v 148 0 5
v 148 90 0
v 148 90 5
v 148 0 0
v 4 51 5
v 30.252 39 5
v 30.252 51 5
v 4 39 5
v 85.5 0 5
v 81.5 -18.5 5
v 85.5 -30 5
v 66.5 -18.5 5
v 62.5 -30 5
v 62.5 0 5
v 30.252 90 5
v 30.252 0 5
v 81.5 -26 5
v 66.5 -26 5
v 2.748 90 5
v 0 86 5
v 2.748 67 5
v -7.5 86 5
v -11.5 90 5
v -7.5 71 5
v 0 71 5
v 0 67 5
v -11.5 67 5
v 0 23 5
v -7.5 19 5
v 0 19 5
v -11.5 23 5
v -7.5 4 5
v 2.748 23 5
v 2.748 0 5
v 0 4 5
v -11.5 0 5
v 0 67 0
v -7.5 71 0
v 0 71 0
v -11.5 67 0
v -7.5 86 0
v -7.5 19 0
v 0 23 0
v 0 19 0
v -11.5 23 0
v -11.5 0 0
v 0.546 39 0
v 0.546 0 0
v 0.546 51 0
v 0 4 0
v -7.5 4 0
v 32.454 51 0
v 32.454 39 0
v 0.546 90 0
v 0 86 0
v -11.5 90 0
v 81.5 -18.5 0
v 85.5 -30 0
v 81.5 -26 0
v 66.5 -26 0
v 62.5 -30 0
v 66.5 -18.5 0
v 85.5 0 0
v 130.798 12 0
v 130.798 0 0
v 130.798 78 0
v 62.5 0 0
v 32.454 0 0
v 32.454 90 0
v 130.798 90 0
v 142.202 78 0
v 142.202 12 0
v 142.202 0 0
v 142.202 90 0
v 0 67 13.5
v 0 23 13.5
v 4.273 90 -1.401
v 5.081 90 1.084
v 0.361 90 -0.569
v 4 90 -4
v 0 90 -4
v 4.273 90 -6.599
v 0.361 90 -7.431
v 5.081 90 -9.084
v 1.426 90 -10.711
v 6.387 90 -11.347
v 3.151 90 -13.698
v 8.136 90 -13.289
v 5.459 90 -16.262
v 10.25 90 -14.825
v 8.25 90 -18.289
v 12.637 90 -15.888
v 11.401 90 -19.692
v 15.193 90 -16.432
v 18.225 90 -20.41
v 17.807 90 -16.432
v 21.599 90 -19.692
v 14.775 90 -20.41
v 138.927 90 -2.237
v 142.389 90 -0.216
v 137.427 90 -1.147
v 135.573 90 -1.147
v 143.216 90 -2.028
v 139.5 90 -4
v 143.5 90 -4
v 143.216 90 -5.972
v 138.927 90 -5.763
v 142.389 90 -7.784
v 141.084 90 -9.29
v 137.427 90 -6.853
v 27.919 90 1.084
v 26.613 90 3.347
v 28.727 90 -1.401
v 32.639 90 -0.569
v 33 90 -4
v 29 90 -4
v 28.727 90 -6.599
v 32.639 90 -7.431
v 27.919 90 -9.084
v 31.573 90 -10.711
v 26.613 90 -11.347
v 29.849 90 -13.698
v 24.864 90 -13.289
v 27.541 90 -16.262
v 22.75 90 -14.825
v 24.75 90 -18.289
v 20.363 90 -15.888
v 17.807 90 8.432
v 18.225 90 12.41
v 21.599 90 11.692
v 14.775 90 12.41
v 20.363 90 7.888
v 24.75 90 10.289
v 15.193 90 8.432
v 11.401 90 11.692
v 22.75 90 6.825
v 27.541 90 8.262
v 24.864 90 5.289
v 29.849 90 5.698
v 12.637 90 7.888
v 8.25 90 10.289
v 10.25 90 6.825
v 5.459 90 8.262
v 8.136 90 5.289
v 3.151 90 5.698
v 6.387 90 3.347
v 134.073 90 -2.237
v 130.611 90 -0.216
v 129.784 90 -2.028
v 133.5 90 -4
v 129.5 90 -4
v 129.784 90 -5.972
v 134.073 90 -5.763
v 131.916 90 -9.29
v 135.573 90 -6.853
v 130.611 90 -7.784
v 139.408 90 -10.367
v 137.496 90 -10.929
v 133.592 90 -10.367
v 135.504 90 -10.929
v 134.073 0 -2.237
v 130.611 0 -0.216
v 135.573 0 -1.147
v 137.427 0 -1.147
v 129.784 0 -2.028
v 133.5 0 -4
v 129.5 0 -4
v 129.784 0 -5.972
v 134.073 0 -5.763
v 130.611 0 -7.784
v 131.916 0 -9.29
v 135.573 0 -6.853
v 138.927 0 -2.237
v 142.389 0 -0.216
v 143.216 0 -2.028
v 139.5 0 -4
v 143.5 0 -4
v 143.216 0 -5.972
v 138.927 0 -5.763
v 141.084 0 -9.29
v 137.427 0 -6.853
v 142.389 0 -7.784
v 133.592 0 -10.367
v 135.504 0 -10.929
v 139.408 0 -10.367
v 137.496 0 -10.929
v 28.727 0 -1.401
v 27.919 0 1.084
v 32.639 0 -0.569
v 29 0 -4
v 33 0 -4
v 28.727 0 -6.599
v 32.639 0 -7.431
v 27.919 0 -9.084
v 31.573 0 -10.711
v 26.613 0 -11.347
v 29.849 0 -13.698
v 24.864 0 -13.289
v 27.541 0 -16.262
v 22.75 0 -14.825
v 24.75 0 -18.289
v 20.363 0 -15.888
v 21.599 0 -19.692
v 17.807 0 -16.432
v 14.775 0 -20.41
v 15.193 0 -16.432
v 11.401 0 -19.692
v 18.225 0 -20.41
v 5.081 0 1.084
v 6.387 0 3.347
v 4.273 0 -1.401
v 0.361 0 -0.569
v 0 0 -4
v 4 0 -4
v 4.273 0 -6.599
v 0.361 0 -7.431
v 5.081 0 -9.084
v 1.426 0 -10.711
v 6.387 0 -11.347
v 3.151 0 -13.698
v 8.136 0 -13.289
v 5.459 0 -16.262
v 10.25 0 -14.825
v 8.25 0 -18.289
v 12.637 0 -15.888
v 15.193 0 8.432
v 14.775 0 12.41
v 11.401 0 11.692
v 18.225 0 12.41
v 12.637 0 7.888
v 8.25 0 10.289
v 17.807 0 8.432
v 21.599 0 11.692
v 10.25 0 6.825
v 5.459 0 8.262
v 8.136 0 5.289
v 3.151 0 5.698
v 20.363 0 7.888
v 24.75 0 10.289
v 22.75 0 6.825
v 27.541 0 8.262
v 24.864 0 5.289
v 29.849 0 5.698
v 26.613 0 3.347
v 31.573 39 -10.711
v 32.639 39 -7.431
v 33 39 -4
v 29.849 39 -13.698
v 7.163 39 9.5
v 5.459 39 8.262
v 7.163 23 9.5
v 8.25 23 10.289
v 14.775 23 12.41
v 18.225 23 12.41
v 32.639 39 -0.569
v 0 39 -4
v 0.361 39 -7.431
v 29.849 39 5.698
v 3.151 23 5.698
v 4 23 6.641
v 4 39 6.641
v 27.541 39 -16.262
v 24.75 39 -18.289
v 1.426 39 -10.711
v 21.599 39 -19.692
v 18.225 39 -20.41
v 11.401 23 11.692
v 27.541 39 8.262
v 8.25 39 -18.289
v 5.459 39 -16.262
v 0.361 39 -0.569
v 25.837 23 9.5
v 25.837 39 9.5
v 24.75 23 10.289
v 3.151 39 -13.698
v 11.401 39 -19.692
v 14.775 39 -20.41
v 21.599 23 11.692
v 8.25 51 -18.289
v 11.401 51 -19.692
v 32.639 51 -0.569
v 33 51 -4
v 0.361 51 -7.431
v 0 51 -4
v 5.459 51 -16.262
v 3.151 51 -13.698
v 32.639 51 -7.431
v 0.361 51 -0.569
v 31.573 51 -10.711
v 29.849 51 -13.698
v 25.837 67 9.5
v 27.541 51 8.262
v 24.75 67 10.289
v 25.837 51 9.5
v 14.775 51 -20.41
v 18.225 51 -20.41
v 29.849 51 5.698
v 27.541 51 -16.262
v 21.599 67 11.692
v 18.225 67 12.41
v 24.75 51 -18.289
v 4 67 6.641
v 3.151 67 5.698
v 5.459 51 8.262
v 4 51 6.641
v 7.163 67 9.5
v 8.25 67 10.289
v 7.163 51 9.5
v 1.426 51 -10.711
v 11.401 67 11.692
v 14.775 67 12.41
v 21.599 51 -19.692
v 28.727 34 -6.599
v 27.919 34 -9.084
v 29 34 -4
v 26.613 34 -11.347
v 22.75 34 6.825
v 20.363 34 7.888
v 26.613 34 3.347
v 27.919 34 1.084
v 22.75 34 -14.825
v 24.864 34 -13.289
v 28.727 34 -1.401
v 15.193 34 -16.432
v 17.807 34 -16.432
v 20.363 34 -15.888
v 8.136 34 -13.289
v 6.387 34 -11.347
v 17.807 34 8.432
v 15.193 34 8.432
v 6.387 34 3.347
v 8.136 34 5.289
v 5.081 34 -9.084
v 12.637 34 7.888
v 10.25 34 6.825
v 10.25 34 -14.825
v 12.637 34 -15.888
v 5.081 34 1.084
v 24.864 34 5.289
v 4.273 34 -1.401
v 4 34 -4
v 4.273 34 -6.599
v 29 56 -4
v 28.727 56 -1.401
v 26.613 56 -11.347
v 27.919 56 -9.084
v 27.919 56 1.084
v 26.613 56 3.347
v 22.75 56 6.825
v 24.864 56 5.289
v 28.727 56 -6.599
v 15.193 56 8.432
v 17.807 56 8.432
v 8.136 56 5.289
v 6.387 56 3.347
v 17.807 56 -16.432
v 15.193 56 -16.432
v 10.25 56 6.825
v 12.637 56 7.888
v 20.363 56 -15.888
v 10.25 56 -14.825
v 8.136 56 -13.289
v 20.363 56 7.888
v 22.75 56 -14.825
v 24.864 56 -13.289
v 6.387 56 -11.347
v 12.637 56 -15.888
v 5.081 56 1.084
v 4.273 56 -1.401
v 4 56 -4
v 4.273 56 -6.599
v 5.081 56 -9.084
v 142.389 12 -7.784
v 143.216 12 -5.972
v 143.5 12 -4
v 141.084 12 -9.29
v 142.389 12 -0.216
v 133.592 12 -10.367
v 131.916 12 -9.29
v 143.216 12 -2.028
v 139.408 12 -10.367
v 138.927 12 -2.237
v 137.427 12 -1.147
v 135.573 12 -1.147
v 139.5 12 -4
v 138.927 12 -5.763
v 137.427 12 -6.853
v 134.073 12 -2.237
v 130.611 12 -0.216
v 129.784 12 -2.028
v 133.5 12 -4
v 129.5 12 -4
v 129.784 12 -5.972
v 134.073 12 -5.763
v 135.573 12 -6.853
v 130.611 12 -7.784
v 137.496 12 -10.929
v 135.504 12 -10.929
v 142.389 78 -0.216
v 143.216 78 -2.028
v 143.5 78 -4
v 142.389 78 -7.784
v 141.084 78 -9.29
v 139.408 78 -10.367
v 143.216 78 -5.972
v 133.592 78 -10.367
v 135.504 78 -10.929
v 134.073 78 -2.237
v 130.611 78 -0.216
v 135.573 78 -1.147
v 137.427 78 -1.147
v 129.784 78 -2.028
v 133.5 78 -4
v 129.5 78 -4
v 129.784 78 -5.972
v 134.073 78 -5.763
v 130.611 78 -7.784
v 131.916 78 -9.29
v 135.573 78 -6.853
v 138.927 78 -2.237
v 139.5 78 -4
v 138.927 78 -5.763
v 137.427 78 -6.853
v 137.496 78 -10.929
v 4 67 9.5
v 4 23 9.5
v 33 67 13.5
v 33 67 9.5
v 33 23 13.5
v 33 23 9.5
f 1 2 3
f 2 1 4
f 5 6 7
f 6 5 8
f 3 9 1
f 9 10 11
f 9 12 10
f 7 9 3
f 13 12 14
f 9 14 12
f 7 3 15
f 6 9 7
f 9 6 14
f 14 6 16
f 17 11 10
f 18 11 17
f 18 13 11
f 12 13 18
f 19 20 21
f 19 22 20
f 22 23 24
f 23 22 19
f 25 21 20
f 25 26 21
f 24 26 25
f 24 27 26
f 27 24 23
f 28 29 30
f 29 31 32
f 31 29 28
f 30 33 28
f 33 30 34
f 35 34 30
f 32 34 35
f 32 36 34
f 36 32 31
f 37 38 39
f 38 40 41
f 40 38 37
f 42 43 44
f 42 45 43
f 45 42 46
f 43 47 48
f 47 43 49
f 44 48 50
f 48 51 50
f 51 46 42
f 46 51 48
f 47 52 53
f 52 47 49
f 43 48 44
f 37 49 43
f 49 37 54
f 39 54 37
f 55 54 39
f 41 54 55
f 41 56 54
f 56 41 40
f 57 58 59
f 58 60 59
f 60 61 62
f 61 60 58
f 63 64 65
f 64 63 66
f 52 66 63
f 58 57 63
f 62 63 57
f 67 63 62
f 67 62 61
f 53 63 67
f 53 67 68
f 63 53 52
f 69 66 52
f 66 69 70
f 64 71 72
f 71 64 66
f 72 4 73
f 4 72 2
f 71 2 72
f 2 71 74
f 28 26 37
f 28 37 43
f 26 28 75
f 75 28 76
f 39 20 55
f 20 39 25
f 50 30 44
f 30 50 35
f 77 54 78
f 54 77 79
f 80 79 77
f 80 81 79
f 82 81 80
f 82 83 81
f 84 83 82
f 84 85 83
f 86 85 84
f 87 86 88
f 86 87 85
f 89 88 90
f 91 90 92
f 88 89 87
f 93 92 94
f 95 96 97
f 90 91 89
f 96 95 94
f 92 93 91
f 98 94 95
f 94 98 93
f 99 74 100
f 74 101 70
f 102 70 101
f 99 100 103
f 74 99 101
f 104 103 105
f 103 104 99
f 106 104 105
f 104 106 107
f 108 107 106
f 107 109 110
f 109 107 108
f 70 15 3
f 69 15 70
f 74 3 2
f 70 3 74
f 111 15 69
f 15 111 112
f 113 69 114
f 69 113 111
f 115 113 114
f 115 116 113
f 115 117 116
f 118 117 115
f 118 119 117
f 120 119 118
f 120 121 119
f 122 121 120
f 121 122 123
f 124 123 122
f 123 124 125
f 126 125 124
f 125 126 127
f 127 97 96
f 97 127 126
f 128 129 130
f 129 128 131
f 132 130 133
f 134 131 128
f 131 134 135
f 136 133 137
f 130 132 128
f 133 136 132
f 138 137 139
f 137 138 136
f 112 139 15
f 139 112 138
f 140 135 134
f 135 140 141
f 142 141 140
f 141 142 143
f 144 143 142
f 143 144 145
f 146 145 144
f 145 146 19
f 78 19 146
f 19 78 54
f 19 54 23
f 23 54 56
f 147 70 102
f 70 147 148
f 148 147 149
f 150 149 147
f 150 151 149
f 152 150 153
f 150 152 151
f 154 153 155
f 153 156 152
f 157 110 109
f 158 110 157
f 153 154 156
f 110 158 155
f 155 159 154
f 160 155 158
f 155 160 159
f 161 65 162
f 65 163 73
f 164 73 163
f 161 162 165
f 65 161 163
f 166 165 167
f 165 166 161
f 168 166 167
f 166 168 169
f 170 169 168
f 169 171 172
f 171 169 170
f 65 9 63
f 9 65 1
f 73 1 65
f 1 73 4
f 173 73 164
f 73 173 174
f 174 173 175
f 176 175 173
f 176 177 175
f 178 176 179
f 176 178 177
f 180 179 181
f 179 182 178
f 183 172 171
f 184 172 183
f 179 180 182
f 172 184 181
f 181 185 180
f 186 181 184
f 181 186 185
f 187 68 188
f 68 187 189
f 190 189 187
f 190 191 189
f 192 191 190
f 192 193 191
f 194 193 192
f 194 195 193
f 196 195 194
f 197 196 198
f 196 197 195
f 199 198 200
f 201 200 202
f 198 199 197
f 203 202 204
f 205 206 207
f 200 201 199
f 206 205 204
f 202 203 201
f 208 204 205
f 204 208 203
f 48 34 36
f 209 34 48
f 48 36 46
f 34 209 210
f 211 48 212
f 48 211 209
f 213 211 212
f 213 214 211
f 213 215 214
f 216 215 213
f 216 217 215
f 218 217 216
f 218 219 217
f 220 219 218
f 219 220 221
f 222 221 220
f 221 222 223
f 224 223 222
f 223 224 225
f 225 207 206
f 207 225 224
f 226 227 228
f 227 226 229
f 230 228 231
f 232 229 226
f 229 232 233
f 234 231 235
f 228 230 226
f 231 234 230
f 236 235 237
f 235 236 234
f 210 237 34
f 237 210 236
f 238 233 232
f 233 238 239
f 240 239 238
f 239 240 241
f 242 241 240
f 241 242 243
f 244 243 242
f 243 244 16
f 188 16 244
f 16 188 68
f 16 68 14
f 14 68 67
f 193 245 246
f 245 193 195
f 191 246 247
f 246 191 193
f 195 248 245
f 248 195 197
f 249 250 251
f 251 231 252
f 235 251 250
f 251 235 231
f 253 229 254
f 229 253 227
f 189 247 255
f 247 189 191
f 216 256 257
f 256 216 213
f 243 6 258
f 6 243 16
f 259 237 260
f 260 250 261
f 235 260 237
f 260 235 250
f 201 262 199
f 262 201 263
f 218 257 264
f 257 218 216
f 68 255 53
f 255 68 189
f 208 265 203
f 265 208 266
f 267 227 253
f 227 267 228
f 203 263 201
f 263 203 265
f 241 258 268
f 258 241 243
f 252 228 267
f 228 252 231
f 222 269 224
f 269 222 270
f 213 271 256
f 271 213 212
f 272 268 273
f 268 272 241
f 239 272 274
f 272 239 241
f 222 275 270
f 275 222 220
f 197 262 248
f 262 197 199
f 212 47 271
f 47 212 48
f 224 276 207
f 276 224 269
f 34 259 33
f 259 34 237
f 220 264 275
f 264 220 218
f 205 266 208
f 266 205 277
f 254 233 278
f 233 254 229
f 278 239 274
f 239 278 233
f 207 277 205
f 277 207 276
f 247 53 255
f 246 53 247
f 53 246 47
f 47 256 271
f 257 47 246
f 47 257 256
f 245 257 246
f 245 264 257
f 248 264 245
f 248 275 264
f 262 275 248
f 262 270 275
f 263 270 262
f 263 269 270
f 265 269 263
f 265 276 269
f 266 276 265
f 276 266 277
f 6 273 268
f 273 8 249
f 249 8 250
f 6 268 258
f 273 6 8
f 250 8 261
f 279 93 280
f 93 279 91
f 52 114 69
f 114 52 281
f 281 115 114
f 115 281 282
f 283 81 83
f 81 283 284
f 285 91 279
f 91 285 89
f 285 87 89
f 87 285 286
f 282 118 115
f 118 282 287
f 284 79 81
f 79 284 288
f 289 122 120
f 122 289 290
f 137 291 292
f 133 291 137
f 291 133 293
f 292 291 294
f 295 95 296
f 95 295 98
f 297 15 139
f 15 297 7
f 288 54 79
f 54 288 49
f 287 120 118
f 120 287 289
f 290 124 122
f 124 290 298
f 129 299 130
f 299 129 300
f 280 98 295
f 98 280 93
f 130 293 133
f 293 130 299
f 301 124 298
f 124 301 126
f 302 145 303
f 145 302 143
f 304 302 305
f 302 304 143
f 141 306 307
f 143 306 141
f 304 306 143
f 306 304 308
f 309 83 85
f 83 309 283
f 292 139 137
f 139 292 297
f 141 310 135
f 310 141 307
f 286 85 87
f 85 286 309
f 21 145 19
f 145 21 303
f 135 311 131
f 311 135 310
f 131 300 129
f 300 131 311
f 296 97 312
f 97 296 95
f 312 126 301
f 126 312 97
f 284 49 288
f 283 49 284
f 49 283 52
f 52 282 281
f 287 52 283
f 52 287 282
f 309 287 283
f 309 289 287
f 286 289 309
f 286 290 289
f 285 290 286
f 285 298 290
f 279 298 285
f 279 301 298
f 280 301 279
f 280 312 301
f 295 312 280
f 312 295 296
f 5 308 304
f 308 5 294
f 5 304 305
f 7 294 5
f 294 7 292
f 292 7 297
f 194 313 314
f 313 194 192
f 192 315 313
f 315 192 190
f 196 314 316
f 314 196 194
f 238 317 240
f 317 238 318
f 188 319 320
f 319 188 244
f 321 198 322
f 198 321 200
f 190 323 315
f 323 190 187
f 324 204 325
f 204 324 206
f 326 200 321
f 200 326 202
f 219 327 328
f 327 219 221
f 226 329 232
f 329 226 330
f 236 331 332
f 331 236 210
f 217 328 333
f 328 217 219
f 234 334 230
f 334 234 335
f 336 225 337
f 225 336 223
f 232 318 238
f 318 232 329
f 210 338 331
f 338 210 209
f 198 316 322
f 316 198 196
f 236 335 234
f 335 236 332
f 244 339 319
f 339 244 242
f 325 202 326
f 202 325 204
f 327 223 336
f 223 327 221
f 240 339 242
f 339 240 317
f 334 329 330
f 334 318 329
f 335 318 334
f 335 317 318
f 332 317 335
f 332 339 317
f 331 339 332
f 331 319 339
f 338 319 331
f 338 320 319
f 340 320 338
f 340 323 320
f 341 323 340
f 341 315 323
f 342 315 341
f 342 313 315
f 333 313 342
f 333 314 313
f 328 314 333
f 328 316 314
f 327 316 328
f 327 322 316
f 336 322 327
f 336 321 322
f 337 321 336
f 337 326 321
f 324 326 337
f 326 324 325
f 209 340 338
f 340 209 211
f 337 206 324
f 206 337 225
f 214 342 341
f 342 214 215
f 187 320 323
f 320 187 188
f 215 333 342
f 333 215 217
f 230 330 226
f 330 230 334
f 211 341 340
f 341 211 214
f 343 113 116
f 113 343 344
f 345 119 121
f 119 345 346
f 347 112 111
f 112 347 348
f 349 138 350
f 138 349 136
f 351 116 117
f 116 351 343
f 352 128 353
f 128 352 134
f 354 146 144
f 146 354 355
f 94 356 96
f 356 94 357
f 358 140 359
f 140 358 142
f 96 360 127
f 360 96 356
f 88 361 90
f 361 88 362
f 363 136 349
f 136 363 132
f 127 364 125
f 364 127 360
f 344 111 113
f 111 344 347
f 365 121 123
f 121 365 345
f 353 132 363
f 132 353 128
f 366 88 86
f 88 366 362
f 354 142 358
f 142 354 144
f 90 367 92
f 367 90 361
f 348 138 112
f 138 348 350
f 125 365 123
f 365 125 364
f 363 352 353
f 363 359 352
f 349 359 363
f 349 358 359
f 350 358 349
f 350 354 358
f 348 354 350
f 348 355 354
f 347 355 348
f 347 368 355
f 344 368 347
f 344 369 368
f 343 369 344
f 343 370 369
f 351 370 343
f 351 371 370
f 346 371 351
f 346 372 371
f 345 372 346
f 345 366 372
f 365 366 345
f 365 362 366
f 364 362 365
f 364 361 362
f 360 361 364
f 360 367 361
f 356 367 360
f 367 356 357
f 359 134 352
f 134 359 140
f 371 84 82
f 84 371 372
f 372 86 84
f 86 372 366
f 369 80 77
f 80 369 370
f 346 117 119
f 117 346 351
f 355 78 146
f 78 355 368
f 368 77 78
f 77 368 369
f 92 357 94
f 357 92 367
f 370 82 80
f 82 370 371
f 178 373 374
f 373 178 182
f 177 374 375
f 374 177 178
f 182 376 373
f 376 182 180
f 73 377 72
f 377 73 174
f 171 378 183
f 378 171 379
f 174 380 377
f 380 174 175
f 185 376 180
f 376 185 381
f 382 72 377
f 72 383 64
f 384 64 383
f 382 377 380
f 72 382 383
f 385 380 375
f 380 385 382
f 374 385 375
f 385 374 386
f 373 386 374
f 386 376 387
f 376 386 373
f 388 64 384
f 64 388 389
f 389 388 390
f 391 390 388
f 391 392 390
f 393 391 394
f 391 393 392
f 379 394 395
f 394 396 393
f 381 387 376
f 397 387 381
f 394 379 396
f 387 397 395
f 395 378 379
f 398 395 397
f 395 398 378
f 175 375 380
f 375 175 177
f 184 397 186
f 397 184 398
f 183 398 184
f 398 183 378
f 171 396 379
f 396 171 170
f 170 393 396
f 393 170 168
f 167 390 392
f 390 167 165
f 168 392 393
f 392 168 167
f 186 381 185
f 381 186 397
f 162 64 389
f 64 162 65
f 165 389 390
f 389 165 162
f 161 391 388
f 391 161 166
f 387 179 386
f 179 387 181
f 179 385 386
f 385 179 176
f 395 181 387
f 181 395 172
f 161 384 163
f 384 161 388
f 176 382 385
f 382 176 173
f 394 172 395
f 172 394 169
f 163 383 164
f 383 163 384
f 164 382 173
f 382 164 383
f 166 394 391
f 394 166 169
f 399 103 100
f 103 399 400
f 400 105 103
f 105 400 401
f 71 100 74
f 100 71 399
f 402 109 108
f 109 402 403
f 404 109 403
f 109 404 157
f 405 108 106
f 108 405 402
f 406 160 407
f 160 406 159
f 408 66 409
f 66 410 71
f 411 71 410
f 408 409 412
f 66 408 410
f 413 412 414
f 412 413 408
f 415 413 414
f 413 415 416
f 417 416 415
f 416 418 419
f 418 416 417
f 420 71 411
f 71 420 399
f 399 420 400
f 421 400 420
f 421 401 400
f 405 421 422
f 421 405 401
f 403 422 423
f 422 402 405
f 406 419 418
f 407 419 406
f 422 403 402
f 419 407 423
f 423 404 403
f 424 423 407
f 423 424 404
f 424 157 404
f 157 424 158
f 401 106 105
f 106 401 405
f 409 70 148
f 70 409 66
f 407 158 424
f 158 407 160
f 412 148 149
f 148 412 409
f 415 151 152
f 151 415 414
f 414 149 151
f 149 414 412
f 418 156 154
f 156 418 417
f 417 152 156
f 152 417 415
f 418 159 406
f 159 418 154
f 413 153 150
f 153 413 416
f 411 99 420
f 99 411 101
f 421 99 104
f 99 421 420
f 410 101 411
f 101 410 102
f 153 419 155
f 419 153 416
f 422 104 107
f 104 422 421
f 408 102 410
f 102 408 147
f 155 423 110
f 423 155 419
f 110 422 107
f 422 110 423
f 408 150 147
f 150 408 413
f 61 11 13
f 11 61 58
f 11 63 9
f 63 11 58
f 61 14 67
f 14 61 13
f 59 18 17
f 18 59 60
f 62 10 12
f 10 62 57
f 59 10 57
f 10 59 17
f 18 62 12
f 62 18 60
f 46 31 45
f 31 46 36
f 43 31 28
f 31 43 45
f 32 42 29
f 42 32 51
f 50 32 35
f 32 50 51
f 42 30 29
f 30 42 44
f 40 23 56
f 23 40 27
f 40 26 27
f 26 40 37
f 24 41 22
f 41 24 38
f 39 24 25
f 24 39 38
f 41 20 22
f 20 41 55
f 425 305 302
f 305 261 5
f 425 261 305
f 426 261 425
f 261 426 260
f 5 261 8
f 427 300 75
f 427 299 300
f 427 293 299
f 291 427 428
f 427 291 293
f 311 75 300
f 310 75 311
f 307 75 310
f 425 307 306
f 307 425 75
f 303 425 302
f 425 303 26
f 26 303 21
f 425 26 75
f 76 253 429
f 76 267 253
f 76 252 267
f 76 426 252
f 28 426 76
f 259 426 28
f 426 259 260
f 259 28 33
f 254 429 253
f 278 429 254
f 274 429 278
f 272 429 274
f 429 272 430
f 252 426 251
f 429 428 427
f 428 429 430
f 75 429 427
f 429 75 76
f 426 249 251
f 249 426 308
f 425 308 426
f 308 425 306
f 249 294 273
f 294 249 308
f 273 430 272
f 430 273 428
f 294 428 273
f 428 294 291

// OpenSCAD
// Standard dimensions

STANDARD_DEPTH = 4;


// Chassis dimensions

/* AFTER DESIGN HAS BEEN IMPLEMENTED, ONLY THESE VALUES SHOULD BE ADJUSTED */

motor_drop = -4;

motor_radius = 12.5;
motor_depth = 35;

motor_base_radius = motor_radius + STANDARD_DEPTH;
motor_base_depth = motor_depth + STANDARD_DEPTH;

chassis_x = motor_base_radius*2 + 115;
chassis_y = 90;
chassis_z = 5;

tread_length = 120;
tread_width = 15;

sensor_length = 7.5;
sensor_width = 15;

arm_length = tread_width + 2*sensor_length;
arm_width = sensor_width + (2*STANDARD_DEPTH);

bearing_radius = 3;



// Main chassis structure


difference() {
    difference() {
        union() {
            union() {
                // Chassis bed
                cube([chassis_x, chassis_y, chassis_z]);
                
                // Left motor base housing
                translate([motor_base_radius, 0, motor_drop]) {
                    rotate([270, 0, 0]) {
                        cylinder(motor_base_depth, motor_base_radius, motor_base_radius, false);
                    }
                }
            }
            
            // Right motor base housing
            translate([motor_base_radius, chassis_y, motor_drop]) {
                rotate([90, 0, 0]) {
                    cylinder(motor_base_depth, motor_base_radius, motor_base_radius, false);
                }
            }
        }
        
        // Left motor cutout
        translate([motor_base_radius, -1, motor_drop]) {
            rotate([270, 0, 0]) {
                cylinder(motor_depth, motor_radius, motor_radius, false);
            }
        }
    }
    
    // Right motor cutout
    translate([motor_base_radius, chassis_y + 1, motor_drop]) {
        rotate([90, 0, 0]) {
            cylinder(motor_depth, motor_radius, motor_radius, false);
        }
    }
}

// Left bearing
translate([motor_base_radius+tread_length, 0, motor_drop]) {
    rotate([270, 0, 0]) {
        difference() {
            cylinder(STANDARD_DEPTH*3, STANDARD_DEPTH+bearing_radius, STANDARD_DEPTH+bearing_radius, false);
            translate([0, 0, -0.5]) {
                cylinder(STANDARD_DEPTH*3+1, bearing_radius, bearing_radius, false);
            }
        }
    }
}

// Right bearing
translate([motor_base_radius+tread_length, chassis_y, motor_drop]) {
    rotate([90, 0, 0]) {
        difference() {
            cylinder(STANDARD_DEPTH*3, STANDARD_DEPTH+bearing_radius, STANDARD_DEPTH+bearing_radius, false);
            translate([0, 0, -0.5]) {
                cylinder(STANDARD_DEPTH*3+1, bearing_radius, bearing_radius, false);
            }
        }
    }
}

// Arm sensor holder
translate([(chassis_x - arm_width)/2, 0, 0]) {
    rotate([0, 0, 270]) {
        difference() {
            cube([arm_length, arm_width, chassis_z]);
            translate([arm_length - sensor_length - STANDARD_DEPTH, (arm_width-sensor_width)/2, -0.5]) {
                cube([sensor_length, sensor_width, chassis_z+1]);
            }
        }

        // Frontmost support
        polyhedron(
        points = 
        [[arm_length/2, 0, 0], //0
        [arm_length/2, 0, chassis_z], //1 
        [0, 0, 0], //2
        [0, 0, chassis_z], //3
        [0, -(2*STANDARD_DEPTH), 0], //4
        [0, -(2*STANDARD_DEPTH), chassis_z]], //5
        faces = 
        [[0, 2, 4], // bottom
        [1, 3, 5], // top
        [4, 5, 1, 0], // exposed face
        [0, 1, 3, 2], // arm face
        [3, 2, 4, 5]] // chassis face
        );
        
        // Rearmost support
        polyhedron(
        points = 
        [[arm_length/2, arm_width, 0], //0
        [arm_length/2, arm_width, chassis_z], //1 
        [0, arm_width, 0], //2
        [0, arm_width, chassis_z], //3
        [0, arm_width + (2*STANDARD_DEPTH), 0], //4
        [0, arm_width + (2*STANDARD_DEPTH), chassis_z]], //5
        faces = 
        [[0, 2, 4], // bottom
        [1, 3, 5], // top
        [4, 5, 1, 0], // exposed face
        [0, 1, 3, 2], // arm face
        [3, 2, 4, 5]] // chassis face
        );
    }
}

// Front left sensor holder
translate([0, sensor_width + 2*STANDARD_DEPTH, 0]) {
    rotate([0, 0, 180]) {
        difference() {
            cube([sensor_length + STANDARD_DEPTH, sensor_width + 2*STANDARD_DEPTH, chassis_z]);
            translate([0, STANDARD_DEPTH, -0.5]) {
                cube([sensor_length, sensor_width, chassis_z+1]);
            }
        }
    }
}

// Front right sensor holder
translate([0, chassis_y, 0]) {
    rotate([0, 0, 180]) {
        difference() {
            cube([sensor_length + STANDARD_DEPTH, sensor_width + 2*STANDARD_DEPTH, chassis_z]);
            translate([0, STANDARD_DEPTH, -0.5]) {
                cube([sensor_length, sensor_width, chassis_z+1]);
            }
        }
    }
}


// H bridge bed
translate([0, sensor_width+(STANDARD_DEPTH*2), 0]) {
    cube([STANDARD_DEPTH, chassis_y - 2*(sensor_width+(STANDARD_DEPTH*2)), motor_base_radius+motor_drop]);
    translate([0, 0, motor_base_radius+motor_drop-3]) {
        cube([motor_base_radius*2, chassis_y - 2*(sensor_width+(STANDARD_DEPTH*2)), STANDARD_DEPTH]);
    }
}
